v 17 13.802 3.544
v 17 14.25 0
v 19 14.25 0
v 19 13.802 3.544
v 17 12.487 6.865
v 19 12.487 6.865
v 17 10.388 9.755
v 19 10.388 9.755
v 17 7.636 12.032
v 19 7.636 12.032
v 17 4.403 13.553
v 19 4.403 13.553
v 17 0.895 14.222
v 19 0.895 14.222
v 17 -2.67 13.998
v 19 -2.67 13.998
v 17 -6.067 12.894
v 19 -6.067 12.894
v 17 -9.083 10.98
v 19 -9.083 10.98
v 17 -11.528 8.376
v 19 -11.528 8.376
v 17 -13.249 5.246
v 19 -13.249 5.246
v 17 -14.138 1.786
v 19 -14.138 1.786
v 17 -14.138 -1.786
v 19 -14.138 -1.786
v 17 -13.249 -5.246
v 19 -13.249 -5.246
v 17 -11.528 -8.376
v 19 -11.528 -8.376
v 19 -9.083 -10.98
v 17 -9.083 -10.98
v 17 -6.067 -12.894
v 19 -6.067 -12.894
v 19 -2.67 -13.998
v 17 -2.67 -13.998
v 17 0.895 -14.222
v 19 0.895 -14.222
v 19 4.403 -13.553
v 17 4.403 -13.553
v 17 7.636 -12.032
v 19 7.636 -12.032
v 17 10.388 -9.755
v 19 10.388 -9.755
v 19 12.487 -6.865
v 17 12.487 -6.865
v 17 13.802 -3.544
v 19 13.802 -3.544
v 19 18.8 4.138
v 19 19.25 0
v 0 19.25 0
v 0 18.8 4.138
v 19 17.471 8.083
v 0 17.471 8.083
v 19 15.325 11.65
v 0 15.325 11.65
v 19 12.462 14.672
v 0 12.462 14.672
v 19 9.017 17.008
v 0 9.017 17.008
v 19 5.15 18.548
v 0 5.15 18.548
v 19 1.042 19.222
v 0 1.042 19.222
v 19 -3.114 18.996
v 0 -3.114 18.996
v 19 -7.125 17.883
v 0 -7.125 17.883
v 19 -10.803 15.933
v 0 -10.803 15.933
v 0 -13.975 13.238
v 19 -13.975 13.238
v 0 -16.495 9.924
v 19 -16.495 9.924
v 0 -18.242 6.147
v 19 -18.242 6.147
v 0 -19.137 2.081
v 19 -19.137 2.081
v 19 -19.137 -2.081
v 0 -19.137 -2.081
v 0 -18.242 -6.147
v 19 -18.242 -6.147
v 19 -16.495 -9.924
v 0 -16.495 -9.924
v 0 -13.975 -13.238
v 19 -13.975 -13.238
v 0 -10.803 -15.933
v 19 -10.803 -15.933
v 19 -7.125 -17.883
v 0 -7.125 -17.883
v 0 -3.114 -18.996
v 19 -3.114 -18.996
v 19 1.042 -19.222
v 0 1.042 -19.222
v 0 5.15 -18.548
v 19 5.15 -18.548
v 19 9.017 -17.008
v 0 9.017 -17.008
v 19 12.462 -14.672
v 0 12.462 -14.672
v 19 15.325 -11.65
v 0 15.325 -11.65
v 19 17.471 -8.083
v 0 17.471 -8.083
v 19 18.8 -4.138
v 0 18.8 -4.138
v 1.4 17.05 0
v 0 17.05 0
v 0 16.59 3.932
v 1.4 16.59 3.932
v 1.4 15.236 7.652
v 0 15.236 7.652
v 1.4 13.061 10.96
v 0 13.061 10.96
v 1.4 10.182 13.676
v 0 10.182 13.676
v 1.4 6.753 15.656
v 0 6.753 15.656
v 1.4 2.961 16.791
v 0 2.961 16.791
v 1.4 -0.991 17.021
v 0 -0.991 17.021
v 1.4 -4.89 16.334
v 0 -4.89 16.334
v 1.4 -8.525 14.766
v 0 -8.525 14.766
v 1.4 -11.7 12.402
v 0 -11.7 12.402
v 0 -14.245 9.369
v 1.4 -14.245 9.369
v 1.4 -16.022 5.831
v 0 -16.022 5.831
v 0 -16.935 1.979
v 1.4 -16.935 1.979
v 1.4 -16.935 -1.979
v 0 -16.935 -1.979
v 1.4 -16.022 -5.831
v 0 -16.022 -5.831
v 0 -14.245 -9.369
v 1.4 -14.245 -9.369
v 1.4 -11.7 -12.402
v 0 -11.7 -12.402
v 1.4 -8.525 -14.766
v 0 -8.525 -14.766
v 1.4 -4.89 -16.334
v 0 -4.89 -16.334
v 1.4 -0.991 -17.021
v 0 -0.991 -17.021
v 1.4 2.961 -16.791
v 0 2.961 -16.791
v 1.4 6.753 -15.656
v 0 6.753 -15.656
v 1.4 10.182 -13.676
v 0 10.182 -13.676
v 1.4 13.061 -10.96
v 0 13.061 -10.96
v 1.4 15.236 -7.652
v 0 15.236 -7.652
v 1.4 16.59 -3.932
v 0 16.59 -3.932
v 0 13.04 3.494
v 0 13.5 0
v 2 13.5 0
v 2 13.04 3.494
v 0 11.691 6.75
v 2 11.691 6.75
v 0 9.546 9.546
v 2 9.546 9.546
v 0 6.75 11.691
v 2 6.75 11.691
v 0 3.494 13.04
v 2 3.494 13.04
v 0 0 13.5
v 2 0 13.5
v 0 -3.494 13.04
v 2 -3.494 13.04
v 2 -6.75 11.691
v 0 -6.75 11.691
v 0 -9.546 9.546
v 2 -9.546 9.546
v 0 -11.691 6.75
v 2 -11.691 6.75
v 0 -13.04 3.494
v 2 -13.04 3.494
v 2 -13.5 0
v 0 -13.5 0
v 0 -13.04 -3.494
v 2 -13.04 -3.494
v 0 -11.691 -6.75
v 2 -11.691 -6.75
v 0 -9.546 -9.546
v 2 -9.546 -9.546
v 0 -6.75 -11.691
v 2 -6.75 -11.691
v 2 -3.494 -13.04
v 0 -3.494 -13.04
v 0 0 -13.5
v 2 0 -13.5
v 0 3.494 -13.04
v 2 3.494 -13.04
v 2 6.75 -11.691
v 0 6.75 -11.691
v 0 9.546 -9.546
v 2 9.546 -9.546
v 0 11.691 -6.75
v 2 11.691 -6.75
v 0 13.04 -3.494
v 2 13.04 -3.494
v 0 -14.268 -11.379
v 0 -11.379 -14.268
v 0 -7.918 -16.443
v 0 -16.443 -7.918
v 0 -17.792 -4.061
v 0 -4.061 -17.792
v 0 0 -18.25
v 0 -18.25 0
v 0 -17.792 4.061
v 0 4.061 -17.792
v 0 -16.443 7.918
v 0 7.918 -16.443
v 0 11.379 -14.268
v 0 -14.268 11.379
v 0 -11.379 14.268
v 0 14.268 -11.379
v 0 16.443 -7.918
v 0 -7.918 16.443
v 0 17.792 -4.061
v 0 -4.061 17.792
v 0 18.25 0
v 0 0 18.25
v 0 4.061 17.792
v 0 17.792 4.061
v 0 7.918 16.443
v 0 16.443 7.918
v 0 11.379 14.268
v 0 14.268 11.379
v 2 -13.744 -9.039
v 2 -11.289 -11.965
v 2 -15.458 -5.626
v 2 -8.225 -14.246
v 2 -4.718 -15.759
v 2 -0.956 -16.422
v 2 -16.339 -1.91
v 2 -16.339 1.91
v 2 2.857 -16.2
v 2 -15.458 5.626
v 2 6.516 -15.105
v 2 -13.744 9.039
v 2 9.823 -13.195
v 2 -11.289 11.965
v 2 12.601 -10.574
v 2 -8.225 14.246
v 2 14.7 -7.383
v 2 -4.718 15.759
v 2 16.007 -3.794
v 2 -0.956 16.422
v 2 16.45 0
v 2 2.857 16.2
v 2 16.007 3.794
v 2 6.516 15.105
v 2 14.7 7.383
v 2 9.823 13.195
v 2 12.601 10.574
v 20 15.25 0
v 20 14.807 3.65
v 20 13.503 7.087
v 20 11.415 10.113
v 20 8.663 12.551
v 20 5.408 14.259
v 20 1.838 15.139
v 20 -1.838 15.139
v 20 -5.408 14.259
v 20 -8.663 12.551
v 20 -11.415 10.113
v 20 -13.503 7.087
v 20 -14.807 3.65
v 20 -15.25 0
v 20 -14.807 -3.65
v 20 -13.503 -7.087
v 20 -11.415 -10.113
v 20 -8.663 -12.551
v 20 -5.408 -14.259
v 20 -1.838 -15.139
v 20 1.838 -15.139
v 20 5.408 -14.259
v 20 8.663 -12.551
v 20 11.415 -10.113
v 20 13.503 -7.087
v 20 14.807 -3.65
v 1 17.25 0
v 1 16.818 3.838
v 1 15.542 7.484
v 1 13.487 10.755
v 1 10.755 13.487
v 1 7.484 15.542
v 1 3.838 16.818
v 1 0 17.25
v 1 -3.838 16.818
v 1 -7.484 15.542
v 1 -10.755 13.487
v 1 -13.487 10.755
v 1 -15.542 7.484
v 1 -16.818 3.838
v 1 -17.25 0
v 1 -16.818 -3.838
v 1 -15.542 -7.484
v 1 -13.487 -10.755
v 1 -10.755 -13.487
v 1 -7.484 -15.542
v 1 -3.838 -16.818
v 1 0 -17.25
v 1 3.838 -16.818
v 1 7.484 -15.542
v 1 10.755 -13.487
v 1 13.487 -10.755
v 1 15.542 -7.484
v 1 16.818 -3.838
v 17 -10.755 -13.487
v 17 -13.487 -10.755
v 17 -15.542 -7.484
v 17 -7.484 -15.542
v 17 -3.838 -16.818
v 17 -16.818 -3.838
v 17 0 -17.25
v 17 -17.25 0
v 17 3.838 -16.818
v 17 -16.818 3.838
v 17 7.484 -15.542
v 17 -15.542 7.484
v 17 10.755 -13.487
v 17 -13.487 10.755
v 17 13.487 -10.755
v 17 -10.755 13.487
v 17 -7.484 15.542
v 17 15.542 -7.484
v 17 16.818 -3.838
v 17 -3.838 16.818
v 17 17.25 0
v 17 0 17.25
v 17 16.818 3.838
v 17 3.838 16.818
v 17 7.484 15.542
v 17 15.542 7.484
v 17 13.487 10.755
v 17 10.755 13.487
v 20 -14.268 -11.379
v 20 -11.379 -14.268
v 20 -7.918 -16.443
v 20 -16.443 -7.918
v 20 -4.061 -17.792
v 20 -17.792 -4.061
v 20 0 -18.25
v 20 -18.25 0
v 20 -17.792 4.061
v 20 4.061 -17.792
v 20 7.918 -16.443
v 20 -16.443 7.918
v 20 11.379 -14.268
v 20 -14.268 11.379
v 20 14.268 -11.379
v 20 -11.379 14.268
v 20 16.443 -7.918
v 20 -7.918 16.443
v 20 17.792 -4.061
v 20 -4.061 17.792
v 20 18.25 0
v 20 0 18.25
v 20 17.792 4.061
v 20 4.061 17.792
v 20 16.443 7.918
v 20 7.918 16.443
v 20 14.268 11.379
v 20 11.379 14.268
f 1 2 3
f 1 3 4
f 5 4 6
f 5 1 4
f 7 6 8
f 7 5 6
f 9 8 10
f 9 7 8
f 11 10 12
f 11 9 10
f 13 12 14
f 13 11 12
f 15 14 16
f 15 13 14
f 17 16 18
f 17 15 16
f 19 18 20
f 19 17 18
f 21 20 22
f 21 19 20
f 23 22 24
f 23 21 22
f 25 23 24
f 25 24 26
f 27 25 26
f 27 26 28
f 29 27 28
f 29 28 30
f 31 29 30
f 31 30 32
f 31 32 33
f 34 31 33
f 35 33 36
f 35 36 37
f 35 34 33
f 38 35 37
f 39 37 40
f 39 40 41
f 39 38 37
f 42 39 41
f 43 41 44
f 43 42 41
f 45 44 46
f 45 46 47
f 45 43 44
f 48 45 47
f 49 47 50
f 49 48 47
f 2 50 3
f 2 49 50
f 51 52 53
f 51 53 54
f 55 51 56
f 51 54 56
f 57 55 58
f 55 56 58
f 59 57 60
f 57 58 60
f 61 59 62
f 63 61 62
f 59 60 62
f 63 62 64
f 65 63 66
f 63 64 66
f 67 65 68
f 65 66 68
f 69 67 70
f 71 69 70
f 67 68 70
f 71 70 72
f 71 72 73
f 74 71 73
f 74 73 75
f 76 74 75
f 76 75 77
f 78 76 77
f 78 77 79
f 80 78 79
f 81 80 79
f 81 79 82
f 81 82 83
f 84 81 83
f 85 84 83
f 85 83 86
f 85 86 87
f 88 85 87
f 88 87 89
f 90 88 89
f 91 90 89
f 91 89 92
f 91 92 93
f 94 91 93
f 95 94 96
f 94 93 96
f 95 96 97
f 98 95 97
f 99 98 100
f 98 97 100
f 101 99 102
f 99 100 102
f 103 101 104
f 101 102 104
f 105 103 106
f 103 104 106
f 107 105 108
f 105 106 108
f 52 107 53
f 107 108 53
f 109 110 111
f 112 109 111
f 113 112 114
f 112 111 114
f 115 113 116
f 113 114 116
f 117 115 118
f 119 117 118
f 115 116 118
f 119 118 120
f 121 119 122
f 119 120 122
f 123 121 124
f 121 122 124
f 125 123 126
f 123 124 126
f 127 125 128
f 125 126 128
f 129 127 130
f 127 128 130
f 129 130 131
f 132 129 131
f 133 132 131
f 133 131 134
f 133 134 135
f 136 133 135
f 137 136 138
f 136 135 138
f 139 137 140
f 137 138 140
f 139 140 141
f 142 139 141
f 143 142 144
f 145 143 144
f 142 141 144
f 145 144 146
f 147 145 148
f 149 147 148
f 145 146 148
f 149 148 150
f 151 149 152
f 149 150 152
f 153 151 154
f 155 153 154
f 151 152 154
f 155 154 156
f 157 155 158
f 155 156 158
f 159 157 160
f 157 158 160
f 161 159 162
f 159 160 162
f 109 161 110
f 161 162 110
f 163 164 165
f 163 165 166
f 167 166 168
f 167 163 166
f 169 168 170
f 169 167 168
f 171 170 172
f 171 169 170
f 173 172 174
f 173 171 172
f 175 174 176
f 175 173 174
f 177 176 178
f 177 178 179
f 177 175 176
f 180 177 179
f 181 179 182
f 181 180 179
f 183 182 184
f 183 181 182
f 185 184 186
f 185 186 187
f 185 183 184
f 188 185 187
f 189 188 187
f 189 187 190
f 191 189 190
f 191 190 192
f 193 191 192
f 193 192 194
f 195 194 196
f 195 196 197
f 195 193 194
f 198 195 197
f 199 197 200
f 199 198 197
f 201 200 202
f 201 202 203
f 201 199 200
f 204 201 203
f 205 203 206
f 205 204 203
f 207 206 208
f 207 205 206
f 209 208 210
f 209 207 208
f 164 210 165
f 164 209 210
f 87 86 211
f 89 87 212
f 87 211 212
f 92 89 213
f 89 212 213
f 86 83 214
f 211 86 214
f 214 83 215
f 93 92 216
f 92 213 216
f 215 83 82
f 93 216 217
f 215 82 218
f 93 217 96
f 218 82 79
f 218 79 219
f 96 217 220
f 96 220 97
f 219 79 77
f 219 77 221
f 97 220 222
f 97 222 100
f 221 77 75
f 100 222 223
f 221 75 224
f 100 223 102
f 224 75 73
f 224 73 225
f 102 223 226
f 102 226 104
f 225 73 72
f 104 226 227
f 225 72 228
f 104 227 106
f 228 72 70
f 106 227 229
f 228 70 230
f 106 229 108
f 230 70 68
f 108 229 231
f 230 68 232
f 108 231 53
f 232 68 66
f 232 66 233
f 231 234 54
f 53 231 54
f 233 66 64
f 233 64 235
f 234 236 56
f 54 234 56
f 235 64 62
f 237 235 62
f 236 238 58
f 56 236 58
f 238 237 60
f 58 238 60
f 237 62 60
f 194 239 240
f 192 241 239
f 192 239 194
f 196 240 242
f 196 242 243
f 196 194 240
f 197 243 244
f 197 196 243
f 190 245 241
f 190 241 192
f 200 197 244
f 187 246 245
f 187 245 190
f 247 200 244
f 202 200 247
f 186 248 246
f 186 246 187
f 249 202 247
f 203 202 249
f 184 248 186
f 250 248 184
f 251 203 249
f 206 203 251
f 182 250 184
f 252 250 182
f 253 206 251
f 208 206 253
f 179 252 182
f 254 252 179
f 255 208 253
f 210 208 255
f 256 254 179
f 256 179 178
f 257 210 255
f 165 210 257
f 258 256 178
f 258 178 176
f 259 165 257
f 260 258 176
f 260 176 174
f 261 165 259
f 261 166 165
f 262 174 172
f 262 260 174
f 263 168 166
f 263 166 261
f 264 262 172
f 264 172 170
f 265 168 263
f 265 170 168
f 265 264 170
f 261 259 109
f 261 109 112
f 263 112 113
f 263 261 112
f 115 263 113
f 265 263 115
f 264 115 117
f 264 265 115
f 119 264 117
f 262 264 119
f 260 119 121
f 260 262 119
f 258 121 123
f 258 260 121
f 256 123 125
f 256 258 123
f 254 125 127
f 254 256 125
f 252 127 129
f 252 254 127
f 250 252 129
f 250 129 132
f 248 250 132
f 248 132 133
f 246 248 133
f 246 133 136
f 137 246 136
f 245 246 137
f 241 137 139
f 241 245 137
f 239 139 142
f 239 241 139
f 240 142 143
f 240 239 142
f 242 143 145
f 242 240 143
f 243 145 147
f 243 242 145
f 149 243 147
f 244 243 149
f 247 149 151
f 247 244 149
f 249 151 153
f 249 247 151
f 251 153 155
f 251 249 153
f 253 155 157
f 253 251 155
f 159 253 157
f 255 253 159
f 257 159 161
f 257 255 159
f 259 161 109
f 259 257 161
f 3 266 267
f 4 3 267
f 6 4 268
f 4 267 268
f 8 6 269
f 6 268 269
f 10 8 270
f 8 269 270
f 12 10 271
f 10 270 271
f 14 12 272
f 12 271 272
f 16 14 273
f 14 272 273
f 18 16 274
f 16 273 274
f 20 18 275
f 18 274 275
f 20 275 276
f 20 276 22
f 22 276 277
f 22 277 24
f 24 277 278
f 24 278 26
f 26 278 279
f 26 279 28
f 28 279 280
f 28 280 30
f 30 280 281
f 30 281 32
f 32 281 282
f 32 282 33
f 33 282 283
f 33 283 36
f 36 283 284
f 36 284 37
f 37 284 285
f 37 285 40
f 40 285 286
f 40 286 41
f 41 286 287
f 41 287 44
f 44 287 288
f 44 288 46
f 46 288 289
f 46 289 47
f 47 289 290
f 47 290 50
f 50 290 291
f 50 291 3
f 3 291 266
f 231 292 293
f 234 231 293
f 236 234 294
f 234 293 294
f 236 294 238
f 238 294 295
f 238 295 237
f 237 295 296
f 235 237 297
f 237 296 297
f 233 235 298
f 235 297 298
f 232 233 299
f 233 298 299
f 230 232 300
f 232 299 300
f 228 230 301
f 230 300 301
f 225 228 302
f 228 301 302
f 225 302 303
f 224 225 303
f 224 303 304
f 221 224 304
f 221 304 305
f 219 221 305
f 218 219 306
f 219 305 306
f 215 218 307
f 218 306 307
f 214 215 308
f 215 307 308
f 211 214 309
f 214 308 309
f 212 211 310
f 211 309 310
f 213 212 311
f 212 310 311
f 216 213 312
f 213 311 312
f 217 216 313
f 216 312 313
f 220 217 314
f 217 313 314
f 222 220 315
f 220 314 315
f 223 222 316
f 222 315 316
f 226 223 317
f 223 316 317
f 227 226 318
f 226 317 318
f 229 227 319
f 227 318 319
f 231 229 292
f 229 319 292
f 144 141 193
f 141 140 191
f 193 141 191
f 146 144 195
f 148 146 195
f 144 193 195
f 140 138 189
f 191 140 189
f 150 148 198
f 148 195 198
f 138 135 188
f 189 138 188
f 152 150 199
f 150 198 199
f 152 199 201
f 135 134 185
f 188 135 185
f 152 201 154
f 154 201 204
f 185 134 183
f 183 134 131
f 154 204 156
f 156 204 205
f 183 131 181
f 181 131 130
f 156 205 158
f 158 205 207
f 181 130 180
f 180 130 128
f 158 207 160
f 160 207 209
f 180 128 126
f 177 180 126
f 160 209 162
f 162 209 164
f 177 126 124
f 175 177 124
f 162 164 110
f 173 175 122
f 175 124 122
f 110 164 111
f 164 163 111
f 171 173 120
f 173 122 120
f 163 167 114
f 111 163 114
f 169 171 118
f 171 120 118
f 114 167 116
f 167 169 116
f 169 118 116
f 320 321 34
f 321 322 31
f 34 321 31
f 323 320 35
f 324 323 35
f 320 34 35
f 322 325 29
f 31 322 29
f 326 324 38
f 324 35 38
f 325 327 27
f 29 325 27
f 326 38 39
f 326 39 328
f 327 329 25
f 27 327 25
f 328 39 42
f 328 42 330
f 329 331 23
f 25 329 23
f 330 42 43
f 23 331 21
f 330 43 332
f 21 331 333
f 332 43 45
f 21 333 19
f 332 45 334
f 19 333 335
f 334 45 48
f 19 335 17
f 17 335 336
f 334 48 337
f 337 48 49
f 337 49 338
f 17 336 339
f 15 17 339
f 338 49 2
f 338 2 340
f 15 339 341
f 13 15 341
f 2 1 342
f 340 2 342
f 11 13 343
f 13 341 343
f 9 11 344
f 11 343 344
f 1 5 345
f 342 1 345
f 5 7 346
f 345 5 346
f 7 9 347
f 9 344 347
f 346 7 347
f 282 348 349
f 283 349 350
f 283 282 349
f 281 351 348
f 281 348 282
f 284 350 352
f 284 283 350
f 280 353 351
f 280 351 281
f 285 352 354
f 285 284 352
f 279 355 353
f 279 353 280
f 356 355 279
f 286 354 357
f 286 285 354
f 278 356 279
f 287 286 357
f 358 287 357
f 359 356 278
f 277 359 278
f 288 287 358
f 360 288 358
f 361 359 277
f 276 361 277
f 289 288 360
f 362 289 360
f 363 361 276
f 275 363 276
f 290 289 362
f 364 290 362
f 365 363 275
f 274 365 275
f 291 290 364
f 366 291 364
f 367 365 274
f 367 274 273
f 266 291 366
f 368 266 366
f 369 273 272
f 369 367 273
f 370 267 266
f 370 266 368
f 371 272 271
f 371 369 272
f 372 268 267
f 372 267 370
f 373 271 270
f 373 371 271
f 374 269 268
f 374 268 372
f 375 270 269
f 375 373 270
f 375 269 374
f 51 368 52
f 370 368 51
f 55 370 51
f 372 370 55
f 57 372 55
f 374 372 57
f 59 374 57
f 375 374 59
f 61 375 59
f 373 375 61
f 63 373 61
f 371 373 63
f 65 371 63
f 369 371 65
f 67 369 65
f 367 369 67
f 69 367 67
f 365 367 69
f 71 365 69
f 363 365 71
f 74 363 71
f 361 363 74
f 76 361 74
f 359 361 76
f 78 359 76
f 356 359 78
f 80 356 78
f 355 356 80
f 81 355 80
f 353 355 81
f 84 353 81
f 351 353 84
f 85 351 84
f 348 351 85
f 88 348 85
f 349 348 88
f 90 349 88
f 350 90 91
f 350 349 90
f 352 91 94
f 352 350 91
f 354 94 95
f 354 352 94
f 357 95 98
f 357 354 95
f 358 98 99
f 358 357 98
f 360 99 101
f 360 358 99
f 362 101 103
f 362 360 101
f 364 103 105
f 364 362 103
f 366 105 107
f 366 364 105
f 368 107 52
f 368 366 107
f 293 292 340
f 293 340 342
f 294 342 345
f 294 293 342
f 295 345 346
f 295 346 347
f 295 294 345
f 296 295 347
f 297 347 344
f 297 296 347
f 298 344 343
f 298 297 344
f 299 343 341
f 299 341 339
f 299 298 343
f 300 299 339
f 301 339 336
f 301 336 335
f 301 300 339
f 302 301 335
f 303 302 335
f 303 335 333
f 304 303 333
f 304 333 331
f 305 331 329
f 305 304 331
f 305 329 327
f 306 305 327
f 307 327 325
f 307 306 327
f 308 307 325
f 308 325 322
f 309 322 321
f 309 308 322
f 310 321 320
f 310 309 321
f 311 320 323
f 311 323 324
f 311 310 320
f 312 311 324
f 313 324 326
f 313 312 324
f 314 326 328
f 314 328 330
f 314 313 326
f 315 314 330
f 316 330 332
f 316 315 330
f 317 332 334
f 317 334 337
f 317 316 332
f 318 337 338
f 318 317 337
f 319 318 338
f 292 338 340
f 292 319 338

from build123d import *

# Parameters (mm, degrees)
F0_R     = 19.25
F0_R_2   = 17.25
F1_DEPTH = 17
F2_R     = 19.25
F2_R_2   = 14.25
F3_DEPTH = 3
F4_SIZE  = 1
F5_R     = 17.05
F5_R_2   = 13.5
F6_DEPTH = 2
F7_SIZE  = 0.6


with BuildPart() as f1:
    # F0 (on Right) → F1 (new body)
    with BuildSketch(Plane.YZ):
        Circle(F0_R)
        Circle(F0_R_2, mode=Mode.SUBTRACT)
    extrude(amount=F1_DEPTH)

    # F2 (on face) → F3 (join)
    with BuildSketch(Plane.YZ.offset(17)):
        Circle(F2_R)
        Circle(F2_R_2, mode=Mode.SUBTRACT)
    extrude(amount=F3_DEPTH)

    # F4
    f4_edges = [f1.edges().sort_by_distance(p)[0] for p in [
        (20, -19.25, 0),
        (20, -14.25, 0),
        (0, -17.25, 0),
    ]]
    chamfer(f4_edges, length=F4_SIZE)


with BuildPart() as f6:
    # F5 (on Right) → F6 (new body)
    with BuildSketch(Plane.YZ):
        Circle(F5_R)
        Circle(F5_R_2, mode=Mode.SUBTRACT)
    extrude(amount=F6_DEPTH)

    # F7
    f7_edges = [f6.edges().sort_by_distance(p)[0] for p in [
        (2, -17.05, 0),
    ]]
    chamfer(f7_edges, length=F7_SIZE)


solid = Compound([f1.part, f6.part])
